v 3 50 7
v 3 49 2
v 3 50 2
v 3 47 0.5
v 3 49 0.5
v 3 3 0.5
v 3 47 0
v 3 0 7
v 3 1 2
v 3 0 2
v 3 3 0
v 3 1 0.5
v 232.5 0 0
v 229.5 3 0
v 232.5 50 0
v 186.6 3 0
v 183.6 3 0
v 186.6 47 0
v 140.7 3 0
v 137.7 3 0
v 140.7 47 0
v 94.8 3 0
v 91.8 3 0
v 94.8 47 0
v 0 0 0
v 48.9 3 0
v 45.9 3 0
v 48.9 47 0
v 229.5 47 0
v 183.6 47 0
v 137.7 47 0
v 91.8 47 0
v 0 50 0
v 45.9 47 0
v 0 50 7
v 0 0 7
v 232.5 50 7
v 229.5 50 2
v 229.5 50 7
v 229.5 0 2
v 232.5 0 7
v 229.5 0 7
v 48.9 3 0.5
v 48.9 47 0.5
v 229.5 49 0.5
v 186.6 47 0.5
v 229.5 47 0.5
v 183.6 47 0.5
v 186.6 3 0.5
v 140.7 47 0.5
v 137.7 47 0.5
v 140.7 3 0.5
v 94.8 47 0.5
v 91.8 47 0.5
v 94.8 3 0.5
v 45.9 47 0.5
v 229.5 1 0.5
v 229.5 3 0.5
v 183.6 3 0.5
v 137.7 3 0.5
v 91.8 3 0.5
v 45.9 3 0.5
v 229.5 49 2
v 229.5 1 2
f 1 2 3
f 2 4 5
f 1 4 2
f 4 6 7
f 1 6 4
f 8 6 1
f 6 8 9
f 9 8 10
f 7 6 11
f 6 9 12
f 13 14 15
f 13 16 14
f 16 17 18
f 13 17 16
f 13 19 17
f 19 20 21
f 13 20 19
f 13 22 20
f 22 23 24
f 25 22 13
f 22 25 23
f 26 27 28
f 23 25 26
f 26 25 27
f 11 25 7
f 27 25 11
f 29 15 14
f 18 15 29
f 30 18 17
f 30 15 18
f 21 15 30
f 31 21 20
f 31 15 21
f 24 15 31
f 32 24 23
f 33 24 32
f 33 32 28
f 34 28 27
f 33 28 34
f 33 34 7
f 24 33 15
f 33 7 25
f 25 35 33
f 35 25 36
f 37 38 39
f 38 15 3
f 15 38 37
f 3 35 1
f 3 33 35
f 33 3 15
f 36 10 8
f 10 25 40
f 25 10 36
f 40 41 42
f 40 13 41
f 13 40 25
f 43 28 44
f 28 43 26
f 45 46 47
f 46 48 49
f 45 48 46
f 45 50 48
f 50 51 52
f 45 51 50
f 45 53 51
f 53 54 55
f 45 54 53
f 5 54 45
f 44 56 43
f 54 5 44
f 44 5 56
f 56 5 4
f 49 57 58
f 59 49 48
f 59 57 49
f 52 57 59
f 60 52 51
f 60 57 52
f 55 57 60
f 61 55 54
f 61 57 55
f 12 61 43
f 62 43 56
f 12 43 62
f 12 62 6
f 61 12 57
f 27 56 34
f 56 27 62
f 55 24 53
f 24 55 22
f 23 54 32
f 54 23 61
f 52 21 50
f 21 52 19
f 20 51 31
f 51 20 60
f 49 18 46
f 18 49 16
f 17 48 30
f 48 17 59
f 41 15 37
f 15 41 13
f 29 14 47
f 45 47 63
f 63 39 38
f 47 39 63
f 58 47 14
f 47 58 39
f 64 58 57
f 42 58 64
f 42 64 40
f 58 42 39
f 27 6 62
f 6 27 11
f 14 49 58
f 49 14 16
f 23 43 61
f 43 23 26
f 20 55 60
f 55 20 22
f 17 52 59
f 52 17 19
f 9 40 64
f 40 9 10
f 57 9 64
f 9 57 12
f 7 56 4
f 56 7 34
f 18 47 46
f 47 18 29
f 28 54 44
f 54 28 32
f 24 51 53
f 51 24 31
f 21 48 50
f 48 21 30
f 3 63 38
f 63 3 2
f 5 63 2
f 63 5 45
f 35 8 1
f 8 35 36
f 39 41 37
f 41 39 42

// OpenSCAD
bar_length= 230;
bar_width= 3;
bar_thick = 0.5;

reinforcement_thick = 2;
reinforcement_width = 1;

width = 50;

num_traverse = 5;

module reinforcement() {
    cube([bar_length,reinforcement_width,reinforcement_thick]);
}

module bar() {        
    cube([bar_length,bar_width,bar_thick]);
}

module traverse(height= bar_thick) {
    cube([bar_width,width, height]);
}


bar();
reinforcement();

translate([0,width-bar_width,0])
bar();
translate([0,width-reinforcement_width,0])
reinforcement();


for (i=[0:num_traverse]) {
    translate([(bar_length-bar_thick)/num_traverse*i,0,0])
    traverse();
}

traverse(7);

translate([bar_length-bar_thick,0,0])
traverse(7);
